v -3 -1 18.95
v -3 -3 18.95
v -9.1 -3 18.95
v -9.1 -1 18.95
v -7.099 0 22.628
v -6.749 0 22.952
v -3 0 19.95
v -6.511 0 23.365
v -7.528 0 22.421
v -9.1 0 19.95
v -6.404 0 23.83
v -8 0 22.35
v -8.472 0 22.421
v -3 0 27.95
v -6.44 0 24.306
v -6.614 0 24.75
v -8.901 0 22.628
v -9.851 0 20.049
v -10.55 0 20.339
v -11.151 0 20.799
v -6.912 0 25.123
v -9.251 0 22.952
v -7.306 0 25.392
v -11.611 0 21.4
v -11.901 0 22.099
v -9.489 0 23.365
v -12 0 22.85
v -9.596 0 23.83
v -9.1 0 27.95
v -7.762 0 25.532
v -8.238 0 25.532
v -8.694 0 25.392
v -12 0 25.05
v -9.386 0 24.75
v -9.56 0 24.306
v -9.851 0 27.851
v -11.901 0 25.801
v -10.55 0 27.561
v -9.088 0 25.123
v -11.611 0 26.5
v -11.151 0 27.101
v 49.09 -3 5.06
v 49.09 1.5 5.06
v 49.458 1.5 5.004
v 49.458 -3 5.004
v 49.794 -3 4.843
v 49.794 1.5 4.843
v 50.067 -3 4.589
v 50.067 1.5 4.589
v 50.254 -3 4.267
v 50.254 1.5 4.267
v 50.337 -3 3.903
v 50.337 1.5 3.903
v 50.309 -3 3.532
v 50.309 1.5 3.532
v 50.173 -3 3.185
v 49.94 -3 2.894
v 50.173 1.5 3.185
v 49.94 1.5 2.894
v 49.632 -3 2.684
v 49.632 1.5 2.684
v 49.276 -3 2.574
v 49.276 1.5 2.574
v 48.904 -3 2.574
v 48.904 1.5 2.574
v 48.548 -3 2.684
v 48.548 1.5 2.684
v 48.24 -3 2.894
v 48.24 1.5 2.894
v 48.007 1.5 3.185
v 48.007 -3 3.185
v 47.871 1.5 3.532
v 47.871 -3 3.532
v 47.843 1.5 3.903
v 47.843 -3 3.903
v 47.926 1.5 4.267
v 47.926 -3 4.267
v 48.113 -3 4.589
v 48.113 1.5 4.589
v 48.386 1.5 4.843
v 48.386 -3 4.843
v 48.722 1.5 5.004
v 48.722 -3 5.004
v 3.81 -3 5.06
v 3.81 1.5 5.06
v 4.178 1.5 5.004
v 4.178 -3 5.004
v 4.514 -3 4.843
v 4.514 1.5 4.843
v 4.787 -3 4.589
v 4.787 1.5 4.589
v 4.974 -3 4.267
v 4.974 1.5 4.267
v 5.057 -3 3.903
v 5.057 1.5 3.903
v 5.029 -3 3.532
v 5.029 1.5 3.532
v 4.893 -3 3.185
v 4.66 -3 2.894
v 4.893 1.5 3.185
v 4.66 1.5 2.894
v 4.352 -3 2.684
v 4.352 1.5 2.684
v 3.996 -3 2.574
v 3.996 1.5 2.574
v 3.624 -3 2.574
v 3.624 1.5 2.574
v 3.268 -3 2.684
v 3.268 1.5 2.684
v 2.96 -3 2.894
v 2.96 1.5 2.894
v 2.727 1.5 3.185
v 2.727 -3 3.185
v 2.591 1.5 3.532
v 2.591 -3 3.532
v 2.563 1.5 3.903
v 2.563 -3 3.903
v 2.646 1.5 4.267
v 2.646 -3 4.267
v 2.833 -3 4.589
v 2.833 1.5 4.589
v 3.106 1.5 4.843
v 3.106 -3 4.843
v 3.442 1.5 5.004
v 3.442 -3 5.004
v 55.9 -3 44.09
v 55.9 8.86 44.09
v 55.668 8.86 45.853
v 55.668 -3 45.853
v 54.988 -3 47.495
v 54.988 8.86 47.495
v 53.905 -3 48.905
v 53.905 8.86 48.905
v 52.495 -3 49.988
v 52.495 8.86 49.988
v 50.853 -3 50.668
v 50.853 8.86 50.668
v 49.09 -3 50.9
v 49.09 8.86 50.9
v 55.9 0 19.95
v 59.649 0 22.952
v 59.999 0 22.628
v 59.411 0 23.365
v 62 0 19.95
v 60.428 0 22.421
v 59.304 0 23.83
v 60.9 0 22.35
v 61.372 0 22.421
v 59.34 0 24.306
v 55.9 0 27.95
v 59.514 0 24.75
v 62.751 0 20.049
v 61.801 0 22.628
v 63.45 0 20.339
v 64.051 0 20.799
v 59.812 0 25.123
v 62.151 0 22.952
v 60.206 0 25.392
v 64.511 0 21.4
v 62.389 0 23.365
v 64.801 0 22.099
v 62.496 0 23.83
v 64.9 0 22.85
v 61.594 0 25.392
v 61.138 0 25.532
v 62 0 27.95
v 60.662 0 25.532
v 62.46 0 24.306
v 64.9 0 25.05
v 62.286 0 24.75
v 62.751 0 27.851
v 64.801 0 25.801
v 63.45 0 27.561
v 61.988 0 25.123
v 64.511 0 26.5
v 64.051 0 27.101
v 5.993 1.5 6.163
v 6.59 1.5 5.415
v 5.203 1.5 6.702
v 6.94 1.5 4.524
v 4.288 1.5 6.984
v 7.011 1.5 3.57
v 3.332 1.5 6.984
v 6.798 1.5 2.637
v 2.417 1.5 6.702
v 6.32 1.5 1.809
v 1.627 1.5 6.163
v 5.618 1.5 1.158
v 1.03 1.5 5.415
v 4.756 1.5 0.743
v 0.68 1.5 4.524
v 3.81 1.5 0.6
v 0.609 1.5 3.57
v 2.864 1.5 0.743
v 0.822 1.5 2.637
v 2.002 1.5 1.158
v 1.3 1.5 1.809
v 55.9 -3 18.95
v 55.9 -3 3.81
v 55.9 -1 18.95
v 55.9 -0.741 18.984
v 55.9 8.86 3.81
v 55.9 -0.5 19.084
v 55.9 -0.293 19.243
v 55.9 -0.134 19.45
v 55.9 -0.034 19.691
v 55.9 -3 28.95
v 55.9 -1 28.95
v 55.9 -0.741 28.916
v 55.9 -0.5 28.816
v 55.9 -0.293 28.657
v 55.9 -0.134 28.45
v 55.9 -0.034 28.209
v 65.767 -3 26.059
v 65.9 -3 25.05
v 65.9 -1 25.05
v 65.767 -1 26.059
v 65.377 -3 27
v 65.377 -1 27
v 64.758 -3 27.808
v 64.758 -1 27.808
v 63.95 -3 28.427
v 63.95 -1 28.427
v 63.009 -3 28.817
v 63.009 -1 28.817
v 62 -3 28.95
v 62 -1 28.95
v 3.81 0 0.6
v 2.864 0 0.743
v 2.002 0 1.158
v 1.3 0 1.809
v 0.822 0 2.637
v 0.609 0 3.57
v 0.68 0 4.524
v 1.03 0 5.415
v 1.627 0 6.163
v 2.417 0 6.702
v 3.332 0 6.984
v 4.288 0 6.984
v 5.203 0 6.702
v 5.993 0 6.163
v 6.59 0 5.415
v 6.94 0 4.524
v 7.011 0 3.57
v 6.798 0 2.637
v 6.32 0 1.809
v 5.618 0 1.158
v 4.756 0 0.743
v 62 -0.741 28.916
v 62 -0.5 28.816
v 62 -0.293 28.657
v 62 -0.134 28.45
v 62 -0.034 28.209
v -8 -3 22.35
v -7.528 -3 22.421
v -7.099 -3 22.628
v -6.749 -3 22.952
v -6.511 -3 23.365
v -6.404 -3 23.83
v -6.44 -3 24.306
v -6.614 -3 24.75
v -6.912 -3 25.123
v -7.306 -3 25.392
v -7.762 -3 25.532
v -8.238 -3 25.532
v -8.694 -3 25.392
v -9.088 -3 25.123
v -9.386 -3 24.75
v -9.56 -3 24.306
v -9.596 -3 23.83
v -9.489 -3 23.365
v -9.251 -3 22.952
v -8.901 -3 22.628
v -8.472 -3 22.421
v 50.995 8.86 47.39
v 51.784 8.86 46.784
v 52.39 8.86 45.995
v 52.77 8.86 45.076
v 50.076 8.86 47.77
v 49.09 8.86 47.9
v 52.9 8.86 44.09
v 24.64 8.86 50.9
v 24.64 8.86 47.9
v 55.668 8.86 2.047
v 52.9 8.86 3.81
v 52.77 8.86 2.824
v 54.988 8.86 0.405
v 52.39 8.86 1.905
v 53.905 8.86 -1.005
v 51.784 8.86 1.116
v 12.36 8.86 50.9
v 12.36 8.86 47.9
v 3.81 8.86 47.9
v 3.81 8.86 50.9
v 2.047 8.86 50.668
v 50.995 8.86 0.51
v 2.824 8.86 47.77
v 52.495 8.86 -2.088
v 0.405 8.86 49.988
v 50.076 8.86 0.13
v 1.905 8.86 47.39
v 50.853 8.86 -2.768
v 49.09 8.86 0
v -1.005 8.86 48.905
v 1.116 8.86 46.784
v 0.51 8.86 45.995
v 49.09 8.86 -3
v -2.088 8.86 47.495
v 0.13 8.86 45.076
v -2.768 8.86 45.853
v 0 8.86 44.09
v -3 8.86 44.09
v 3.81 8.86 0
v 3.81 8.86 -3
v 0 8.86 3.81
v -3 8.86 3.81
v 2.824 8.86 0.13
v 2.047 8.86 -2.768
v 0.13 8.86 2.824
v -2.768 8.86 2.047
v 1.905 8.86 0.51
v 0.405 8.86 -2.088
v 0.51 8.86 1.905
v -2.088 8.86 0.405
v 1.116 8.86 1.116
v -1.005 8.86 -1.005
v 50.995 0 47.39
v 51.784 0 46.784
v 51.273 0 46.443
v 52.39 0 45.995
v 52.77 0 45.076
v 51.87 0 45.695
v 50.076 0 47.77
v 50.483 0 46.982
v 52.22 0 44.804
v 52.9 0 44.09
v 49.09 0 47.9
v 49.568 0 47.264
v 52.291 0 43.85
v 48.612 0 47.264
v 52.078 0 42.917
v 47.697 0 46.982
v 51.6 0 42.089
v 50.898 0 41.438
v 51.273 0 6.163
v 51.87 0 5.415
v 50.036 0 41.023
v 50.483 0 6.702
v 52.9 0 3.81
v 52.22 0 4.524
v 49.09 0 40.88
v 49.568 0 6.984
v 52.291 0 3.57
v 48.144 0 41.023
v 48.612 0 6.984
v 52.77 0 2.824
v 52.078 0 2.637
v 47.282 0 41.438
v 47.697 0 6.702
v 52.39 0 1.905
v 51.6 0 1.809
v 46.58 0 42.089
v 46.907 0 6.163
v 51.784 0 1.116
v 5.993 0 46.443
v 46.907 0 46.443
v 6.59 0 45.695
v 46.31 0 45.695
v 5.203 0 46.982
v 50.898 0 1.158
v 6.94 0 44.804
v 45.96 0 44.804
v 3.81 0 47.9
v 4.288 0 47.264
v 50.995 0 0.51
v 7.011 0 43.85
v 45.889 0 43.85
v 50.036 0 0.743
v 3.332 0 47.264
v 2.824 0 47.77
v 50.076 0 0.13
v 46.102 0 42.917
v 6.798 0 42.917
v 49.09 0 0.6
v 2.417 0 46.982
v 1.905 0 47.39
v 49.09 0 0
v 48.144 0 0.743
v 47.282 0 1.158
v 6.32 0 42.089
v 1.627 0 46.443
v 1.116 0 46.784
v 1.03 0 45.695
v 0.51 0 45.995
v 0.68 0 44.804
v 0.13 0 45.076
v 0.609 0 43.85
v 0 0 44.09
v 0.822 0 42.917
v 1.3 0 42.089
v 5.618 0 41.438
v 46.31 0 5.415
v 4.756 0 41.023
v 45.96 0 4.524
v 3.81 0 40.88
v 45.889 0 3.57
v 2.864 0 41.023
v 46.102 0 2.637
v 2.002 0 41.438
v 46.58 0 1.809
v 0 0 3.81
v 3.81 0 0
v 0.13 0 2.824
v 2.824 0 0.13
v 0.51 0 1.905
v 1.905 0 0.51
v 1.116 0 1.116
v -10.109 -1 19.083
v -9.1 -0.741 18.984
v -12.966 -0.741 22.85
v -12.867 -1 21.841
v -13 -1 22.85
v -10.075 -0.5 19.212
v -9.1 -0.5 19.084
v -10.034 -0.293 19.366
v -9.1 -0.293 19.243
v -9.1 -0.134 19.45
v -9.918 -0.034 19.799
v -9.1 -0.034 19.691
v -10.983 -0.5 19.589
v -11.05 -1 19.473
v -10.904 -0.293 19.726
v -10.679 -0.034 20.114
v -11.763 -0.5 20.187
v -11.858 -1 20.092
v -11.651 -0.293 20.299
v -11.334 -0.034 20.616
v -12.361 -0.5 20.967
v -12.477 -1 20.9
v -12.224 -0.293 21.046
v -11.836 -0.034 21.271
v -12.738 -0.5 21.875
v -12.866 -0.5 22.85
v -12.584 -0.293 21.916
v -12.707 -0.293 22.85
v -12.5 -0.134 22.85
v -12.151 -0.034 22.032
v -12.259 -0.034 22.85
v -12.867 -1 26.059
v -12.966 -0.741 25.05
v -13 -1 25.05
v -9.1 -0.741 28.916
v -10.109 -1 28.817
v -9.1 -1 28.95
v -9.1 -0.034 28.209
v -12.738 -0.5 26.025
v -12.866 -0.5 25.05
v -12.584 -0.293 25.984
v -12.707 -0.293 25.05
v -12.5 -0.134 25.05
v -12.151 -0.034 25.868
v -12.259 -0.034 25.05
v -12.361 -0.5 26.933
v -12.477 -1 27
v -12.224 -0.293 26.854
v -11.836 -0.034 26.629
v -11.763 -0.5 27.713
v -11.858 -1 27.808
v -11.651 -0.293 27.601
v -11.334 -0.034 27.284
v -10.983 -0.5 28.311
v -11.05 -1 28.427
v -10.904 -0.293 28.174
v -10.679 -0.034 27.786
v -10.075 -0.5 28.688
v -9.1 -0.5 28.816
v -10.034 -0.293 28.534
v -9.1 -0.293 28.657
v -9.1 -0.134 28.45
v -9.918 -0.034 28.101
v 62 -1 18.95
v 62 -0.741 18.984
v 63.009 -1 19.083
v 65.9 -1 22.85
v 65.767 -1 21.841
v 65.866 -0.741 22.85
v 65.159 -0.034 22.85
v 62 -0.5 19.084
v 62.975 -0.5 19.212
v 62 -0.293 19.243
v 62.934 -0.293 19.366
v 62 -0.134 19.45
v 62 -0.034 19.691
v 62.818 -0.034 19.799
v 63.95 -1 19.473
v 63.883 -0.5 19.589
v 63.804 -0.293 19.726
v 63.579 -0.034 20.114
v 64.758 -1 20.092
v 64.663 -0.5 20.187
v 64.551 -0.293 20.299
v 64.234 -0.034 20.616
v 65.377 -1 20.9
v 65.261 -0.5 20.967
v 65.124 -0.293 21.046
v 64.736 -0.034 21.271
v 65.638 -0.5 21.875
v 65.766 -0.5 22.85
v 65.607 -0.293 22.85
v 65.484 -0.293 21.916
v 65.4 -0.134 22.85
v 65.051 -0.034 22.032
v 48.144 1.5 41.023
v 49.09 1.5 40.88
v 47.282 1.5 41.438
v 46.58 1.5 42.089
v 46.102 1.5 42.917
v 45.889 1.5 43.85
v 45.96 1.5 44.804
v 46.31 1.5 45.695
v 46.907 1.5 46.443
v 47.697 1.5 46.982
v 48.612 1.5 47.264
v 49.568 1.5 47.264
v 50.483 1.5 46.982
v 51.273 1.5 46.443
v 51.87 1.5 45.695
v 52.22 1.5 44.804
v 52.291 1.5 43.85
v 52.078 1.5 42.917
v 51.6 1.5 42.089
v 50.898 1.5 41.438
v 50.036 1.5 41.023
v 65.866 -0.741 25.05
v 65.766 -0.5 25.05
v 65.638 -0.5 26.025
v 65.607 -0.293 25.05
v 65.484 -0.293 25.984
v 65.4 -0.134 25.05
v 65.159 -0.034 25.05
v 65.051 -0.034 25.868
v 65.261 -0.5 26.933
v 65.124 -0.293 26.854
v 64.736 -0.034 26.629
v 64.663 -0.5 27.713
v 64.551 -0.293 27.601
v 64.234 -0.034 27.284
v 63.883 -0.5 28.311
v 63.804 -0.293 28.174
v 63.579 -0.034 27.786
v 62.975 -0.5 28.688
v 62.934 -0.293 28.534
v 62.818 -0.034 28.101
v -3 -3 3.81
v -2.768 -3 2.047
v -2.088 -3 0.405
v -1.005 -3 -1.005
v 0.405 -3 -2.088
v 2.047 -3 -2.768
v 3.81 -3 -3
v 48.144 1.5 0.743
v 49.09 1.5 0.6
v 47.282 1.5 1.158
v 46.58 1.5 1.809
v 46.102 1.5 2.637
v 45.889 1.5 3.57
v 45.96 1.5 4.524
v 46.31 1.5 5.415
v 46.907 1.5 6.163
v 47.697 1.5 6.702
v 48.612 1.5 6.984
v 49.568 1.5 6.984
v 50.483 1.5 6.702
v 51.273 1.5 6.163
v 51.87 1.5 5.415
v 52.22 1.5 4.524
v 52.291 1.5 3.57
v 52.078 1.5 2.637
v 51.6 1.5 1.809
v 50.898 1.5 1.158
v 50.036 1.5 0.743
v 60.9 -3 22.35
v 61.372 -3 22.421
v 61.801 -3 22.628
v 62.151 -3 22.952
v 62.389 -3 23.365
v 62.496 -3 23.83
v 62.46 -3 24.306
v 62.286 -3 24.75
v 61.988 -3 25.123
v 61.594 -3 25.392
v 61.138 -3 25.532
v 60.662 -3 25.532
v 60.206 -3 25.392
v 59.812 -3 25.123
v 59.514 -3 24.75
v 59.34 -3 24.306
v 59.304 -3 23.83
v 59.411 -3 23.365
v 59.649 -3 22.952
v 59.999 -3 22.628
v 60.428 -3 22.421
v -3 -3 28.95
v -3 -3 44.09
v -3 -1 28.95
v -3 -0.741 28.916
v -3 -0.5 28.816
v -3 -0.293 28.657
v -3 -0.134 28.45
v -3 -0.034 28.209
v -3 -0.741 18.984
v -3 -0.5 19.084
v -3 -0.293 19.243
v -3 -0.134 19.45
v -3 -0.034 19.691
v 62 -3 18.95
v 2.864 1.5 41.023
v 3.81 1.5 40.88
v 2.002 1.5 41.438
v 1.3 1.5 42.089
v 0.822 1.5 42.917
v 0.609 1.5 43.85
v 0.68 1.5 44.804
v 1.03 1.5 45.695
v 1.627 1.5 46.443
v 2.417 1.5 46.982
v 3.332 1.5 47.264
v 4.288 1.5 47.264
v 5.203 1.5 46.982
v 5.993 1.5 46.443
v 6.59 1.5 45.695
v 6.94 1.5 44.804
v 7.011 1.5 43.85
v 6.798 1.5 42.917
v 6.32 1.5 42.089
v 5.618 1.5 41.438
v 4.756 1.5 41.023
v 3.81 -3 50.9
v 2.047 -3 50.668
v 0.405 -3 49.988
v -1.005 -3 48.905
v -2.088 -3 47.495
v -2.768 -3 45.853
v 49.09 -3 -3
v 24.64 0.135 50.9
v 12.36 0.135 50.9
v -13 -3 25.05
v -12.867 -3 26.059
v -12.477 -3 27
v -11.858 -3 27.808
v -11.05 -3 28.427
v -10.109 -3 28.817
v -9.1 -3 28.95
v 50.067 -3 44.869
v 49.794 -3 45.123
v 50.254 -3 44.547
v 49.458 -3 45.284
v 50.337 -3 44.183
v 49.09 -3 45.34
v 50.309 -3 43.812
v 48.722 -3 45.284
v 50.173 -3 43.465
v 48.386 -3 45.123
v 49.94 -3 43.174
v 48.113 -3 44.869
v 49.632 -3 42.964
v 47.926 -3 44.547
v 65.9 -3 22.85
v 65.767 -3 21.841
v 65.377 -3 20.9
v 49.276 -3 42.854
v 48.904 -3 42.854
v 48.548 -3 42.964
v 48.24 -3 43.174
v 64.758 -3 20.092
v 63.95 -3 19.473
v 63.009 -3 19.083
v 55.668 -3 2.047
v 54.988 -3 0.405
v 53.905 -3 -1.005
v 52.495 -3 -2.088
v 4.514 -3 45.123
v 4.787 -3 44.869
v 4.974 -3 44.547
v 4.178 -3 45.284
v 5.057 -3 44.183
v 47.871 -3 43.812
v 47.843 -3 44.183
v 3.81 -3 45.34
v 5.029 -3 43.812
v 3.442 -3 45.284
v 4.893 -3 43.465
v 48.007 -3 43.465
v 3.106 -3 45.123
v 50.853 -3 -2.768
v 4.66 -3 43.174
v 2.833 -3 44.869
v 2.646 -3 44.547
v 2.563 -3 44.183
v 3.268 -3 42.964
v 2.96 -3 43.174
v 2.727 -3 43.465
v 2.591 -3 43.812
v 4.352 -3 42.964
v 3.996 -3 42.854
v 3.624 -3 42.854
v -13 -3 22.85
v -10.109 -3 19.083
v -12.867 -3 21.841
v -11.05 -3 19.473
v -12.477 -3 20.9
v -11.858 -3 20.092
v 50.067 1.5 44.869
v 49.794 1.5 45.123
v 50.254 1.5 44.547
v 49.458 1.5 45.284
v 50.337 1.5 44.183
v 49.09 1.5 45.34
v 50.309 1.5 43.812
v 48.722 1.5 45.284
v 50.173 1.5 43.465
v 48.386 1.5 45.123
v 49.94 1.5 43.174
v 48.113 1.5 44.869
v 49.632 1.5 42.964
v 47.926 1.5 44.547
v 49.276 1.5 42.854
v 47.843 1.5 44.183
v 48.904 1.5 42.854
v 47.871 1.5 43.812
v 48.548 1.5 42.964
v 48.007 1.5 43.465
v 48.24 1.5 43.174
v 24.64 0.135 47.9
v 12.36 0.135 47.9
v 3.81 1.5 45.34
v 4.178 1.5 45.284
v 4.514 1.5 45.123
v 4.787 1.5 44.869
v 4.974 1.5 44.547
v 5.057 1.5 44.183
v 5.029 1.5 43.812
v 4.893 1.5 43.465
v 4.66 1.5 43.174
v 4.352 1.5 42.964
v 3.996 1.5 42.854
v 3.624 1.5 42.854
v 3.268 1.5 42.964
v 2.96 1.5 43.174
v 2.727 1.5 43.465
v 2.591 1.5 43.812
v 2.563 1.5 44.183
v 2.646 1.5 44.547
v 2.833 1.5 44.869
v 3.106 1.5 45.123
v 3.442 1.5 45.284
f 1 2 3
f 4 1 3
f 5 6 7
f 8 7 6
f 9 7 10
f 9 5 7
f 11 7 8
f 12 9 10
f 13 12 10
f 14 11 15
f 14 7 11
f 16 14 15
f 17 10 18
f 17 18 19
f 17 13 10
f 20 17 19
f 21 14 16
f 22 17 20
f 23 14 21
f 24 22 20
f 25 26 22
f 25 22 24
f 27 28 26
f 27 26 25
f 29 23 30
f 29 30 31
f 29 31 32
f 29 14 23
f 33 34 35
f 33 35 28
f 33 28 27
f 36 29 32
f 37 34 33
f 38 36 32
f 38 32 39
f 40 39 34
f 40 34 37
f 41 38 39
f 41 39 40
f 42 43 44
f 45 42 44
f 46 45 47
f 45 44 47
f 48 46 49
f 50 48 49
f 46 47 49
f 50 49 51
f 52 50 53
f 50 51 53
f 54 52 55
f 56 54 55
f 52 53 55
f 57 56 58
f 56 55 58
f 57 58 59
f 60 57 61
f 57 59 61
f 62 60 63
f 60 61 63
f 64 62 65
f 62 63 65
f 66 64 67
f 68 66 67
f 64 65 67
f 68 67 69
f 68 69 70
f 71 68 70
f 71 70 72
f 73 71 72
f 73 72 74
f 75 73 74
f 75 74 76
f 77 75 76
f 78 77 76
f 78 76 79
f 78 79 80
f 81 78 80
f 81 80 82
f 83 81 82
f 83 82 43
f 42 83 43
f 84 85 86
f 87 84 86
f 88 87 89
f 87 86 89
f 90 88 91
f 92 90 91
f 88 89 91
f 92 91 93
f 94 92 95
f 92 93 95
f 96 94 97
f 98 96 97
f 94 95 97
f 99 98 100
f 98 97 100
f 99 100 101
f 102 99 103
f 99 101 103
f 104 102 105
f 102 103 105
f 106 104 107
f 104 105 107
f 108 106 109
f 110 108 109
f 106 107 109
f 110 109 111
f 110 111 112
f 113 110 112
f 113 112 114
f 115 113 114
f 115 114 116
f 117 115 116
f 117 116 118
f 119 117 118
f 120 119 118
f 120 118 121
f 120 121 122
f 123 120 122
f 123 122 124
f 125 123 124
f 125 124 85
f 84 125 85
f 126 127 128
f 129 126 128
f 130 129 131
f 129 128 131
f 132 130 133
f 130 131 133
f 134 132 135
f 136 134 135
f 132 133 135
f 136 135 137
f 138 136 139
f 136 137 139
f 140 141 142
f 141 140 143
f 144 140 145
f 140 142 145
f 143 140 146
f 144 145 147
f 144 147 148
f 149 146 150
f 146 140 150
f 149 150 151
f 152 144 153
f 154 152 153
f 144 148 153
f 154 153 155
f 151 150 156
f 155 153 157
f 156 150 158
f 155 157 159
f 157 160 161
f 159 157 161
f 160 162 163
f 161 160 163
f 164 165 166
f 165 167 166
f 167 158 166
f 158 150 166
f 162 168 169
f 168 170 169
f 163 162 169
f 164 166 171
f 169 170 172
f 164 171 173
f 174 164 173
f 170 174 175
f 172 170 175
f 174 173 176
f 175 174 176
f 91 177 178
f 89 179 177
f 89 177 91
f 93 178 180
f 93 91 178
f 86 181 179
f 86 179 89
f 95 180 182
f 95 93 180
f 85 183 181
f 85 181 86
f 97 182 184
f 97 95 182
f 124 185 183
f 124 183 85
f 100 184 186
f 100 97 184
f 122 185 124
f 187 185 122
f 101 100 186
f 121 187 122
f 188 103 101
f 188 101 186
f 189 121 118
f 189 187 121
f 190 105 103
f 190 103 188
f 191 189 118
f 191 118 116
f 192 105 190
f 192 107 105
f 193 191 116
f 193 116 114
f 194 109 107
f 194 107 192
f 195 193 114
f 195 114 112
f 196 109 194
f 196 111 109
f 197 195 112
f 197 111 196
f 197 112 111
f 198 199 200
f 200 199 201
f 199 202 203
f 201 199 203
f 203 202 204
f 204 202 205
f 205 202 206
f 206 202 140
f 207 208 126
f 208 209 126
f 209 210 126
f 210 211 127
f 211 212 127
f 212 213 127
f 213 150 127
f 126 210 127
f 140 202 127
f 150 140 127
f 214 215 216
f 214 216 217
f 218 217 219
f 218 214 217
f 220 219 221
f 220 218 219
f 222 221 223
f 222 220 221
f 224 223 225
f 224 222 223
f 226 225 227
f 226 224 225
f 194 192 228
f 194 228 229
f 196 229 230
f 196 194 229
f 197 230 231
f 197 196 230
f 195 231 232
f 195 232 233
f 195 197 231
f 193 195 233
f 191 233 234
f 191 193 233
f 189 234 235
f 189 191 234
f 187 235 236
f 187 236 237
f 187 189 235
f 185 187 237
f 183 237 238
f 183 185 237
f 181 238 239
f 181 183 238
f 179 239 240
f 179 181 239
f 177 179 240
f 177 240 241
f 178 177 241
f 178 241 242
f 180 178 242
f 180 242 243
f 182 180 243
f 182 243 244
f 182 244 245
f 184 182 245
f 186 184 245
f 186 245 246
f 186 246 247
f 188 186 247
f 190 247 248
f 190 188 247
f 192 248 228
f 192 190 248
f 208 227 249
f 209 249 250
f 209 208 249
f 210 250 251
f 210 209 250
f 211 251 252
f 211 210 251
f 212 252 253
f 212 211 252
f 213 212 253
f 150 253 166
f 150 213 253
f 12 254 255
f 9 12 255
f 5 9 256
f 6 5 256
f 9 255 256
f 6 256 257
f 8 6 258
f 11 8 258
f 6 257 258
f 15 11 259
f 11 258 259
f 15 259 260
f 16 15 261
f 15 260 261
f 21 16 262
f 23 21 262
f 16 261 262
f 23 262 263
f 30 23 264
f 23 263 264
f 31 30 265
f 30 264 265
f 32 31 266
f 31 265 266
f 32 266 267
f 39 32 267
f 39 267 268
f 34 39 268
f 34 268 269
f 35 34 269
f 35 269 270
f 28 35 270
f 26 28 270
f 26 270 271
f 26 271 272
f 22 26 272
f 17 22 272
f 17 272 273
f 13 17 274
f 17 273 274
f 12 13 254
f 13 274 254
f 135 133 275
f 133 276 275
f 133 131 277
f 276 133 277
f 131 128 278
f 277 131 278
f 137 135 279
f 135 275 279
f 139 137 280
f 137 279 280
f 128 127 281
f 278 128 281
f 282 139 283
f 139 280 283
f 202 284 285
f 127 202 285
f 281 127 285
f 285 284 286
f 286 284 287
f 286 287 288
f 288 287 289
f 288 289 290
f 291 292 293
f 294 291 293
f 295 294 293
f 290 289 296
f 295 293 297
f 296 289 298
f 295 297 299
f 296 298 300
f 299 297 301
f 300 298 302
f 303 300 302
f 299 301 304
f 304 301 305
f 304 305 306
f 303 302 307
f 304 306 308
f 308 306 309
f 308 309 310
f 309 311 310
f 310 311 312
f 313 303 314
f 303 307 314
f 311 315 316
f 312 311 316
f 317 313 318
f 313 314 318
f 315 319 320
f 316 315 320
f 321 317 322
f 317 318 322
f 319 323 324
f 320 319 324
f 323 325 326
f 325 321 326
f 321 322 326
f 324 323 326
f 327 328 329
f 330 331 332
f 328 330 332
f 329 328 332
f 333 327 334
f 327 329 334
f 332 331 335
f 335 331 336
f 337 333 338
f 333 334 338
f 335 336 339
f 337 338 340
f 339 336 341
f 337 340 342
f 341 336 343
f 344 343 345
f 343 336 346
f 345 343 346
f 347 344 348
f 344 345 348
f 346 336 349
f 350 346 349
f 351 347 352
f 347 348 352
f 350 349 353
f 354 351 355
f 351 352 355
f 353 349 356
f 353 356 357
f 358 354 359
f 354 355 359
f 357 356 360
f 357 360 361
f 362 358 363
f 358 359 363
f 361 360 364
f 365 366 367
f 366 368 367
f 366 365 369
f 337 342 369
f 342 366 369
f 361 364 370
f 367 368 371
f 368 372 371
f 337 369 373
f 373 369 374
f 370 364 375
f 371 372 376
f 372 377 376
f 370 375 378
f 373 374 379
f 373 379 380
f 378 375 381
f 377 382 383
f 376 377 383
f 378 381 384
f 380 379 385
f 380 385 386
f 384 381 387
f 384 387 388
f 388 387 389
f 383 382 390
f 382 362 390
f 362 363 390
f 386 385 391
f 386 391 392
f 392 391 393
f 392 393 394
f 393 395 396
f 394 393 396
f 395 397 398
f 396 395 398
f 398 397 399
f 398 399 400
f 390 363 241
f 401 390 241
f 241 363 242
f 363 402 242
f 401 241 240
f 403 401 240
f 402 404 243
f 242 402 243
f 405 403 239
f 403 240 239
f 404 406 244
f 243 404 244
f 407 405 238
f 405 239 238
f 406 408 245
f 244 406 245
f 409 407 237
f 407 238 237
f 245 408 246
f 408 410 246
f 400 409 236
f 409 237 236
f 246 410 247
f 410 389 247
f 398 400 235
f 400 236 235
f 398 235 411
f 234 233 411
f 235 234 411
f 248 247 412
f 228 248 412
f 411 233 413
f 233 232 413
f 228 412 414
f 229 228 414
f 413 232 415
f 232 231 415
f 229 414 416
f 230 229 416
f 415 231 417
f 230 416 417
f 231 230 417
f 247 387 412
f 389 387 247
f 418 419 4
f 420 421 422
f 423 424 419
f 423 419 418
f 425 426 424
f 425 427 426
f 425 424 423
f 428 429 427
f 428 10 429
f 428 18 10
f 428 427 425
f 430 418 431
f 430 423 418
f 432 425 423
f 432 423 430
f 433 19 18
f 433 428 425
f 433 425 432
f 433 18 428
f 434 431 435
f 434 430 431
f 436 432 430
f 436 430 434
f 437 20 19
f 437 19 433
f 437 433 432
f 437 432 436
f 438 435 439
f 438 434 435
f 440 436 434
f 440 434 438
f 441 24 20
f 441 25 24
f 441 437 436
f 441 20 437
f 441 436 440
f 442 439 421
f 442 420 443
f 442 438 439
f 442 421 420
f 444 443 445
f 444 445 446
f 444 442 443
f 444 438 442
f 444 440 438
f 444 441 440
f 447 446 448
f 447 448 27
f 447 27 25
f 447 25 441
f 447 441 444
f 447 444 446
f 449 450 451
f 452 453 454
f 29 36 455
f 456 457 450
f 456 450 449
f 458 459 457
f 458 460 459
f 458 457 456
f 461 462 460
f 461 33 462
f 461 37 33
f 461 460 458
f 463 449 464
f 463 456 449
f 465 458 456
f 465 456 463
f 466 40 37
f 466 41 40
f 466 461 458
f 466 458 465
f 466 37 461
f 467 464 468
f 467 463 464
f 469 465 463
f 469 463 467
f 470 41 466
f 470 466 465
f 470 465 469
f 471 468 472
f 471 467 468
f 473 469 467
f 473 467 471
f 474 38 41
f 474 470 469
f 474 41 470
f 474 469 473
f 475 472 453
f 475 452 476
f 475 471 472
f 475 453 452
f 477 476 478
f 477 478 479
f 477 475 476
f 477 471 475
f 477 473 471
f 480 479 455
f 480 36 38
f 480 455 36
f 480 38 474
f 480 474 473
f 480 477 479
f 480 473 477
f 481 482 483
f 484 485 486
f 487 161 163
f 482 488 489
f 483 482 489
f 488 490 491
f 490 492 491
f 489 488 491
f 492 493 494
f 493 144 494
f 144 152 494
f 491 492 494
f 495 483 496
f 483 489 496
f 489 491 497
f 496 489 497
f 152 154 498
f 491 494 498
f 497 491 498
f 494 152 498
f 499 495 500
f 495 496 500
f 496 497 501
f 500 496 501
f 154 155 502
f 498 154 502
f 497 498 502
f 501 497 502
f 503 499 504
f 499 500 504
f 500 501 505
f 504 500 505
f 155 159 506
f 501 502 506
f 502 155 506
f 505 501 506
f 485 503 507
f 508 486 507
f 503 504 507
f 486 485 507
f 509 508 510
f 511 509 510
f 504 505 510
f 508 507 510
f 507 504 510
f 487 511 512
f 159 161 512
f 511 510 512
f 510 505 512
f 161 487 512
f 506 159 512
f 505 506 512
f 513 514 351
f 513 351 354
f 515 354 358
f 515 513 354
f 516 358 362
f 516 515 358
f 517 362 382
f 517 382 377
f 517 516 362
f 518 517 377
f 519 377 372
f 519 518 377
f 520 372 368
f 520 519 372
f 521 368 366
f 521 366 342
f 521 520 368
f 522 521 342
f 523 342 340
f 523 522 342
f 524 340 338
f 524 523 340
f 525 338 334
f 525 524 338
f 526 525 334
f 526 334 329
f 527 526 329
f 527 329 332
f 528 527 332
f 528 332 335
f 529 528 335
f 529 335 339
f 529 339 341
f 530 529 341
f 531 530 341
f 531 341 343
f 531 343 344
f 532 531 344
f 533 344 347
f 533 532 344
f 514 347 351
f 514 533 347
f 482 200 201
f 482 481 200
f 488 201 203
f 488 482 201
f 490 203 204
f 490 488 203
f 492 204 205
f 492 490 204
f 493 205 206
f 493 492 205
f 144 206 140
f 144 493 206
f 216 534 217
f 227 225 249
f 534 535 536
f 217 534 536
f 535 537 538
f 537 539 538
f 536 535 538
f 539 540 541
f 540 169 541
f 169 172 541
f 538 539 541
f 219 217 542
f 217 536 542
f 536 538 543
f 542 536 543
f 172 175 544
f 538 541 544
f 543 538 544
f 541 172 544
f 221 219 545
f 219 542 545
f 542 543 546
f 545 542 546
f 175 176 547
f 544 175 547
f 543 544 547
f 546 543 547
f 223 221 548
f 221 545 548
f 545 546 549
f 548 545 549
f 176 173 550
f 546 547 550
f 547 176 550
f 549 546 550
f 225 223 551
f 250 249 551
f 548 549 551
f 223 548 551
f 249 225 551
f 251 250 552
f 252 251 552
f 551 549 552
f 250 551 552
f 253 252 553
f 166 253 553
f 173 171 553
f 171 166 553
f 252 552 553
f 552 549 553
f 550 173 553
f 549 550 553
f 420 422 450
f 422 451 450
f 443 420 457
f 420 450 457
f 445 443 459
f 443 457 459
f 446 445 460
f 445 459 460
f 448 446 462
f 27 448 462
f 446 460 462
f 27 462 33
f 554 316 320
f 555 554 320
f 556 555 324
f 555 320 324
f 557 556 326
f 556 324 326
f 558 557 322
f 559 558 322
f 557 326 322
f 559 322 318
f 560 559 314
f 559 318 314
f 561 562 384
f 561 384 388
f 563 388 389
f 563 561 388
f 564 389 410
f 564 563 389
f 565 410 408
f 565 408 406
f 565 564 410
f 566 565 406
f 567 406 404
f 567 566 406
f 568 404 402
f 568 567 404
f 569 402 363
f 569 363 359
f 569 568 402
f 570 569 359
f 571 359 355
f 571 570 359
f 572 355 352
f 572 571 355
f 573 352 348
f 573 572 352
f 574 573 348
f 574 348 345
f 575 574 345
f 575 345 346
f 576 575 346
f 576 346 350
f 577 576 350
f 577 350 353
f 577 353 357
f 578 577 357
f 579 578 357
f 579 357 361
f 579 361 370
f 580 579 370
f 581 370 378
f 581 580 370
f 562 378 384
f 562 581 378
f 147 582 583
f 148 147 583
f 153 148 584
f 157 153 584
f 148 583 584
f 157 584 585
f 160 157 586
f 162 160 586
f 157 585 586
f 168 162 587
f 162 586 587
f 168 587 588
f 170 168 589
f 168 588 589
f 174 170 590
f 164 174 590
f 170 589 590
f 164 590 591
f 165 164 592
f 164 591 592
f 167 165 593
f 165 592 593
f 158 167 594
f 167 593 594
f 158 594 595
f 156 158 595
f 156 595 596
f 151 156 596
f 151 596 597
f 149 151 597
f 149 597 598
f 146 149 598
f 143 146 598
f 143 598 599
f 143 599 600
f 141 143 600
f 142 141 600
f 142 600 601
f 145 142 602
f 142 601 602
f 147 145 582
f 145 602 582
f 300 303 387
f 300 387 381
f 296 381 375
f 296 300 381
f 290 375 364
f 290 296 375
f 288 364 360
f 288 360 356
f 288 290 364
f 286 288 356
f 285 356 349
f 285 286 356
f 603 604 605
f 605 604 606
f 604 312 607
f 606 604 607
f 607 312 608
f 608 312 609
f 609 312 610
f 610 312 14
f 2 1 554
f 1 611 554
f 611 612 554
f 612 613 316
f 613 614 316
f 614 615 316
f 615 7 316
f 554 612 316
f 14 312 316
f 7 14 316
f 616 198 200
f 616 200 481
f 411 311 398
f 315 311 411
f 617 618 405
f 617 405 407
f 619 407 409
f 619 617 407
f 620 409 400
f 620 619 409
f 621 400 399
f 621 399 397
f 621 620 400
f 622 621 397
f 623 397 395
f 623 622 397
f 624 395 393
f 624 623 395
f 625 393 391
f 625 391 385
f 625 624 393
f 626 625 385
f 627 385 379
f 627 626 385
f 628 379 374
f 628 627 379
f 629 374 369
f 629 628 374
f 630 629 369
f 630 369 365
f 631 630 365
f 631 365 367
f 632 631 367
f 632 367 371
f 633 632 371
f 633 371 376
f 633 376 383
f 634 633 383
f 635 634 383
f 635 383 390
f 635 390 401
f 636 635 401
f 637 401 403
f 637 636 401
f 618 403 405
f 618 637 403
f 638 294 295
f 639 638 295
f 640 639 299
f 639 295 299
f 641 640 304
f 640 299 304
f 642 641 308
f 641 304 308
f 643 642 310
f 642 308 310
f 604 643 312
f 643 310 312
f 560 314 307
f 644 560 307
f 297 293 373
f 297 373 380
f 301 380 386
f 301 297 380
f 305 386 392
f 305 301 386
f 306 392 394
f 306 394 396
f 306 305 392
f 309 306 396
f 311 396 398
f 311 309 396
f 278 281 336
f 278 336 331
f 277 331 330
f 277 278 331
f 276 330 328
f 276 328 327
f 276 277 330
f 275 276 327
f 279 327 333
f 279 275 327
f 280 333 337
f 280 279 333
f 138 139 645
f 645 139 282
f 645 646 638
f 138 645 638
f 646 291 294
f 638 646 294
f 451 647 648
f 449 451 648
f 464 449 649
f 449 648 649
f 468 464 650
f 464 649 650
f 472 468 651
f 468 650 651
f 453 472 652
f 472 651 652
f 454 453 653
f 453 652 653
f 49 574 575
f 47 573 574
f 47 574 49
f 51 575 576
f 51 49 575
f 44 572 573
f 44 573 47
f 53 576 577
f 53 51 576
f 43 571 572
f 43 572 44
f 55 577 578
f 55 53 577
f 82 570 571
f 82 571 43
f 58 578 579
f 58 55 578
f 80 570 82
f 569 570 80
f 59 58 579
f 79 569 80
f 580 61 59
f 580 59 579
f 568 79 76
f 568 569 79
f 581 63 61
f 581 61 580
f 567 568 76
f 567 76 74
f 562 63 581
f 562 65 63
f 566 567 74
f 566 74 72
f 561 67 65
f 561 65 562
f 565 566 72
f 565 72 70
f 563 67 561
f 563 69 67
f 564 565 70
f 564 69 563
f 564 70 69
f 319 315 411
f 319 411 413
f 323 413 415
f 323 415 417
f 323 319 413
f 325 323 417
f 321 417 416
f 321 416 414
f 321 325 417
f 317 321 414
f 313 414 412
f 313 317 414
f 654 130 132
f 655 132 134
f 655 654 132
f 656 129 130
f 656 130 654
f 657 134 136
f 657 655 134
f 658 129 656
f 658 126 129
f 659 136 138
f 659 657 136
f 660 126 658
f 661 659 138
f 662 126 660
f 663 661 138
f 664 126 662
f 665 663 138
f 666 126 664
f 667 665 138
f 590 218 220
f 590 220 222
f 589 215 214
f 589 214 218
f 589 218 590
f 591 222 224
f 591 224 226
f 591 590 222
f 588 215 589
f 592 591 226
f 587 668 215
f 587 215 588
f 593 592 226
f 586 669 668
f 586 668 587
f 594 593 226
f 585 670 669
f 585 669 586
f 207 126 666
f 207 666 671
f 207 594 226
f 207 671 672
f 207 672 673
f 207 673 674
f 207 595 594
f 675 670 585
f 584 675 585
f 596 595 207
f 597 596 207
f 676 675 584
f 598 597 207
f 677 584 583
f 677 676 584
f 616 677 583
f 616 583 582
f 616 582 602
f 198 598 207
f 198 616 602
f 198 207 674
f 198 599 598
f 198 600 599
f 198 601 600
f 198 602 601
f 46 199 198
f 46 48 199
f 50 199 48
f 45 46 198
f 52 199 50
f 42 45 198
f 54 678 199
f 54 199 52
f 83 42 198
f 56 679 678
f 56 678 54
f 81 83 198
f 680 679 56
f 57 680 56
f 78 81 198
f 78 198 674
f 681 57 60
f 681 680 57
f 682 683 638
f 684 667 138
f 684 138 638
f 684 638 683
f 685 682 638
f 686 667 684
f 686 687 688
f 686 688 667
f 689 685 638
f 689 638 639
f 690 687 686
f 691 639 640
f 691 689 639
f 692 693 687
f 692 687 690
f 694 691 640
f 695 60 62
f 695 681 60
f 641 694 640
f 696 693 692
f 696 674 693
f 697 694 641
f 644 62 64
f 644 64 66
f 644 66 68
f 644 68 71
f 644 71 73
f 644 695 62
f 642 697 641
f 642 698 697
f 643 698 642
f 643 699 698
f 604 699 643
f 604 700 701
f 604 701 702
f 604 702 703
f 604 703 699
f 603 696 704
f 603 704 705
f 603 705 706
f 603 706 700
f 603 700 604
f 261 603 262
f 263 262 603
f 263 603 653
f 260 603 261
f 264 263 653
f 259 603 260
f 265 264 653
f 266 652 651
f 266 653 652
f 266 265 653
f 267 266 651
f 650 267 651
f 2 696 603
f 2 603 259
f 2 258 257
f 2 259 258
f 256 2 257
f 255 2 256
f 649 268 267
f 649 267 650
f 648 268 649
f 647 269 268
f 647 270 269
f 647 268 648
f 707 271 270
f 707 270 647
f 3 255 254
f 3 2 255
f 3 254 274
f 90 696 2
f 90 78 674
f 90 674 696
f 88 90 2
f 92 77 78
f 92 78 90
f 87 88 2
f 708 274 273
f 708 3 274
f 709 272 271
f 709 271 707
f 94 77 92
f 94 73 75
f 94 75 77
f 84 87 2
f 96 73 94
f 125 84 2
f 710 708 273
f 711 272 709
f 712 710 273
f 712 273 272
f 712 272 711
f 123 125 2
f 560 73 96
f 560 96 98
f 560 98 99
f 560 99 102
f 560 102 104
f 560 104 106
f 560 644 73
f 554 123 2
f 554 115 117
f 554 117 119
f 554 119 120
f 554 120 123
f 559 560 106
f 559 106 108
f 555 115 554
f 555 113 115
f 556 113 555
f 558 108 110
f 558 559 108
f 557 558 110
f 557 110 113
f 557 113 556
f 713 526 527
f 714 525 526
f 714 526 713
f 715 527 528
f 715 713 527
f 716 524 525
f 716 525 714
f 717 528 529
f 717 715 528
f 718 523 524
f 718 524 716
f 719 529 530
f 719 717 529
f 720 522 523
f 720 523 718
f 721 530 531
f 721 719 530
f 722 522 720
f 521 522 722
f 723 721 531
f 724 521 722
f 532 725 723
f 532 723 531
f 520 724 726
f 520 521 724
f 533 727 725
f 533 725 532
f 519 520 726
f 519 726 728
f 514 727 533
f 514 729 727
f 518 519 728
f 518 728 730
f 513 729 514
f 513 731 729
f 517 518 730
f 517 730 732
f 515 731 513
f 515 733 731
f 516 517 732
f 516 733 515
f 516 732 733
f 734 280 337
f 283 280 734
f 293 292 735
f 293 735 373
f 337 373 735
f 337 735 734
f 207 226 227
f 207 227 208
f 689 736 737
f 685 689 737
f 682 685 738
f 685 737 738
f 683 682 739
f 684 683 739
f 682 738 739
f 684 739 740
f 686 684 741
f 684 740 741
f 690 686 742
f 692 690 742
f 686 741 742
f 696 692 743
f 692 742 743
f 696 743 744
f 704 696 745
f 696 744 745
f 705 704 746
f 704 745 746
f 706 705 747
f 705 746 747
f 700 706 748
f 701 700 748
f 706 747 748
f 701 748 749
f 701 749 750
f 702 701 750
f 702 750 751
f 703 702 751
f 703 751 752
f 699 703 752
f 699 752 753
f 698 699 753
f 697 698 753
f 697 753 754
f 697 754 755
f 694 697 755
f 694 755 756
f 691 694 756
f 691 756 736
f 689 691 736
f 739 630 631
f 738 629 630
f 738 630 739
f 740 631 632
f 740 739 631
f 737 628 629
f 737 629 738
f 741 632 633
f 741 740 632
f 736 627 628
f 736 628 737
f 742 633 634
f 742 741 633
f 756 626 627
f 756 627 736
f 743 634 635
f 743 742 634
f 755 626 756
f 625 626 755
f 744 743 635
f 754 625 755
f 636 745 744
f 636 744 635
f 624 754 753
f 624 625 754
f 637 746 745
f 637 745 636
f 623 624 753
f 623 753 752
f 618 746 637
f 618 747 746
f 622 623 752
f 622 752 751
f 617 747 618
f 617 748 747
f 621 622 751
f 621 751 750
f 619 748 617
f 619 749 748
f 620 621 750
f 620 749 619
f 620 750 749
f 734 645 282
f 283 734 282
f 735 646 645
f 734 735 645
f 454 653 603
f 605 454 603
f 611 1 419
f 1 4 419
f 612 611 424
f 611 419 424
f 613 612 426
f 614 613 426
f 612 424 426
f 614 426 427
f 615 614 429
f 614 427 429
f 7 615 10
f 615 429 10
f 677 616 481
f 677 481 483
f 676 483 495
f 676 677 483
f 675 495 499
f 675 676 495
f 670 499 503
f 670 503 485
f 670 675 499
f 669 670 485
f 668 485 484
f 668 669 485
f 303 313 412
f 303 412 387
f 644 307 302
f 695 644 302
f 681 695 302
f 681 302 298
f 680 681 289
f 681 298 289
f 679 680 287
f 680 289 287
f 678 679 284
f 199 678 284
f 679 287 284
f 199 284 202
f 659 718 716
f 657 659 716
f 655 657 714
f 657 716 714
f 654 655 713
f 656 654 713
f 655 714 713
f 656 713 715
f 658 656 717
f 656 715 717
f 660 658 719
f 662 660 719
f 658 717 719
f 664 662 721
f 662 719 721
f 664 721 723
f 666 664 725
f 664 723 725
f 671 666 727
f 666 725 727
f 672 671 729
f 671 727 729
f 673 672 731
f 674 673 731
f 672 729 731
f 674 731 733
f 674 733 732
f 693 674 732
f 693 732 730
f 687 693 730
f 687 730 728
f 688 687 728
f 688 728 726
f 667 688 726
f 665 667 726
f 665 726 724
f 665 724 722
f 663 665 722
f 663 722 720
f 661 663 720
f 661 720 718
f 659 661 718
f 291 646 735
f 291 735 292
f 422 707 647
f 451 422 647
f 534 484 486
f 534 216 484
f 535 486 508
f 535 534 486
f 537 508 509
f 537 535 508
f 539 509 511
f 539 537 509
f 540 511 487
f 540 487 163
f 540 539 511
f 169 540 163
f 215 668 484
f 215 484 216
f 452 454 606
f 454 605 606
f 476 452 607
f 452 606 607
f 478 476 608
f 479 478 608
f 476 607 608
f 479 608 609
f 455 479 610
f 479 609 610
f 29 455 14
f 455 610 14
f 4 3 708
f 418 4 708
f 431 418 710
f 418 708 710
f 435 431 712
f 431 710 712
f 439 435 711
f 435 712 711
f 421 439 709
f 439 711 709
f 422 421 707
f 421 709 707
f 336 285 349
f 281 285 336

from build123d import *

# Parameters (mm, degrees)
BOSS_EXTRUDE1_DEPTH = 3
CUT_EXTRUDE1_REACH  = 77.661
SKETCH1_3_R         = 1.25
BOSS_EXTRUDE2_START = 8.86
BOSS_EXTRUDE2_DEPTH = 8.86
BOSS_EXTRUDE3_START = 1.5
SKETCH1_5_R         = 3.21
SKETCH1_5_R_2       = 1.25
BOSS_EXTRUDE3_DEPTH = 1.5
SKETCH2_W           = 12.28
SKETCH2_H           = 8.73
CUT_EXTRUDE2_DEPTH  = 3
SKETCH3_R           = 1.6
BOSS_EXTRUDE4_DEPTH = 3
FILLET1_R           = 1
FILLET2_R           = 1


with BuildPart() as part:
    # Sketch1 → Boss-Extrude1 (new body)
    with BuildSketch(Plane(origin=(0, 0, 0), x_dir=(1, 0, 0), z_dir=(0, 1, 0))):
        with BuildLine():
            Line((3.81, 3), (49.09, 3))
            ThreePointArc((49.09, 3), (53.90539718, 1.00539718), (55.9, -3.81))
            Line((55.9, -3.81), (55.9, -44.09))
            ThreePointArc((55.9, -44.09), (53.90539718, -48.90539718), (49.09, -50.9))
            Line((49.09, -50.9), (3.81, -50.9))
            ThreePointArc((3.81, -50.9), (-1.00539718, -48.90539718), (-3, -44.09))
            Line((-3, -44.09), (-3, -3.81))
            ThreePointArc((-3, -3.81), (-1.00539718, 1.00539718), (3.81, 3))
        make_face()
    extrude(amount=-BOSS_EXTRUDE1_DEPTH)

    # Sketch1<3> → Cut-Extrude1 (cut, up to next)
    with BuildSketch(Plane(origin=(0, 0, 0), x_dir=(1, 0, 0), z_dir=(0, 1, 0)), mode=Mode.PRIVATE) as cut_extrude1_sk1:
        with Locations((49.09, -44.09)):
            Circle(SKETCH1_3_R)
    cut_extrude1_tool1 = extrude(cut_extrude1_sk1.sketch, amount=-CUT_EXTRUDE1_REACH, mode=Mode.PRIVATE) & part.part
    # Sketch1<3> → Cut-Extrude1 (cut, up to next)
    with BuildSketch(Plane(origin=(0, 0, 0), x_dir=(1, 0, 0), z_dir=(0, 1, 0)), mode=Mode.PRIVATE) as cut_extrude1_sk2:
        with Locations((3.81, -44.09)):
            Circle(SKETCH1_3_R)
    cut_extrude1_tool2 = extrude(cut_extrude1_sk2.sketch, amount=-CUT_EXTRUDE1_REACH, mode=Mode.PRIVATE) & part.part
    # Sketch1<3> → Cut-Extrude1 (cut, up to next)
    with BuildSketch(Plane(origin=(0, 0, 0), x_dir=(1, 0, 0), z_dir=(0, 1, 0)), mode=Mode.PRIVATE) as cut_extrude1_sk3:
        with Locations((3.81, -3.81)):
            Circle(SKETCH1_3_R)
    cut_extrude1_tool3 = extrude(cut_extrude1_sk3.sketch, amount=-CUT_EXTRUDE1_REACH, mode=Mode.PRIVATE) & part.part
    # Sketch1<3> → Cut-Extrude1 (cut, up to next)
    with BuildSketch(Plane(origin=(0, 0, 0), x_dir=(1, 0, 0), z_dir=(0, 1, 0)), mode=Mode.PRIVATE) as cut_extrude1_sk4:
        with Locations((49.09, -3.81)):
            Circle(SKETCH1_3_R)
    cut_extrude1_tool4 = extrude(cut_extrude1_sk4.sketch, amount=-CUT_EXTRUDE1_REACH, mode=Mode.PRIVATE) & part.part
    add(cut_extrude1_tool1.solids().sort_by_distance((49.09, 0, 44.09))[0], mode=Mode.SUBTRACT)
    add(cut_extrude1_tool2.solids().sort_by_distance((3.81, 0, 44.09))[0], mode=Mode.SUBTRACT)
    add(cut_extrude1_tool3.solids().sort_by_distance((3.81, 0, 3.81))[0], mode=Mode.SUBTRACT)
    add(cut_extrude1_tool4.solids().sort_by_distance((49.09, 0, 3.81))[0], mode=Mode.SUBTRACT)

    # Sketch1<4> → Boss-Extrude2 (add)
    with BuildSketch(Plane(origin=(0, 0, 0), x_dir=(1, 0, 0), z_dir=(0, 1, 0)).offset(BOSS_EXTRUDE2_START)):
        with BuildLine():
            Line((49.09, 3), (3.81, 3))
            ThreePointArc((3.81, 3), (-1.00539718, 1.00539718), (-3, -3.81))
            Line((-3, -3.81), (-3, -44.09))
            ThreePointArc((-3, -44.09), (-1.00539718, -48.90539718), (3.81, -50.9))
            Line((3.81, -50.9), (49.09, -50.9))
            ThreePointArc((49.09, -50.9), (53.90539718, -48.90539718), (55.9, -44.09))
            Line((55.9, -44.09), (55.9, -3.81))
            ThreePointArc((55.9, -3.81), (53.90539718, 1.00539718), (49.09, 3))
        make_face()
        with BuildLine():
            ThreePointArc((0, -3.81), (1.115923164, -1.115923164), (3.81, 0))
            Line((3.81, 0), (49.09, 0))
            ThreePointArc((49.09, 0), (51.784076836, -1.115923164), (52.9, -3.81))
            Line((52.9, -3.81), (52.9, -44.09))
            ThreePointArc((52.9, -44.09), (51.784076836, -46.784076836), (49.09, -47.9))
            Line((49.09, -47.9), (3.81, -47.9))
            ThreePointArc((3.81, -47.9), (1.115923164, -46.784076836), (0, -44.09))
            Line((0, -44.09), (0, -3.81))
        make_face(mode=Mode.SUBTRACT)
    extrude(amount=-BOSS_EXTRUDE2_DEPTH)

    # Sketch1<5> → Boss-Extrude3 (add)
    # profile 1 of 4: a face of its own
    with BuildSketch(Plane(origin=(0, 0, 0), x_dir=(1, 0, 0), z_dir=(0, 1, 0)).offset(BOSS_EXTRUDE3_START)):
        with Locations((3.81, -3.81)):
            Circle(SKETCH1_5_R)
        with Locations((3.81, -3.81)):
            Circle(SKETCH1_5_R_2, mode=Mode.SUBTRACT)
    # profile 2 of 4: a face of its own
    with BuildSketch(Plane(origin=(0, 0, 0), x_dir=(1, 0, 0), z_dir=(0, 1, 0)).offset(BOSS_EXTRUDE3_START)):
        with Locations((49.09, -3.81)):
            Circle(SKETCH1_5_R)
        with Locations((49.09, -3.81)):
            Circle(SKETCH1_5_R_2, mode=Mode.SUBTRACT)
    # profile 3 of 4: a face of its own
    with BuildSketch(Plane(origin=(0, 0, 0), x_dir=(1, 0, 0), z_dir=(0, 1, 0)).offset(BOSS_EXTRUDE3_START)):
        with Locations((49.09, -44.09)):
            Circle(SKETCH1_5_R)
        with Locations((49.09, -44.09)):
            Circle(SKETCH1_5_R_2, mode=Mode.SUBTRACT)
    # profile 4 of 4: a face of its own
    with BuildSketch(Plane(origin=(0, 0, 0), x_dir=(1, 0, 0), z_dir=(0, 1, 0)).offset(BOSS_EXTRUDE3_START)):
        with Locations((3.81, -44.09)):
            Circle(SKETCH1_5_R)
        with Locations((3.81, -44.09)):
            Circle(SKETCH1_5_R_2, mode=Mode.SUBTRACT)
    extrude(amount=-BOSS_EXTRUDE3_DEPTH)

    # Sketch2 → Cut-Extrude2 (cut)
    with BuildSketch(Plane.XY.offset(50.9)):
        with Locations((18.5, 4.5)):
            Rectangle(SKETCH2_W, SKETCH2_H)
    extrude(amount=-CUT_EXTRUDE2_DEPTH, mode=Mode.SUBTRACT)

    # Sketch3 → Boss-Extrude4 (add)
    # profile 1 of 2: a face of its own
    with BuildSketch(Plane.XZ.offset(3)):
        with BuildLine():
            Line((55.9, 18.95), (62, 18.95))
            ThreePointArc((62, 18.95), (64.757716447, 20.092283553), (65.9, 22.85))
            Line((65.9, 22.85), (65.9, 25.05))
            ThreePointArc((65.9, 25.05), (64.757716447, 27.807716447), (62, 28.95))
            Line((62, 28.95), (55.9, 28.95))
            Line((55.9, 28.95), (55.9, 18.95))
        make_face()
        with Locations((60.9, 23.95)):
            Circle(SKETCH3_R, mode=Mode.SUBTRACT)
    # profile 2 of 2: a face of its own
    with BuildSketch(Plane.XZ.offset(3)):
        with BuildLine():
            Line((-3, 18.95), (-9.1, 18.95))
            ThreePointArc((-9.1, 18.95), (-11.857716447, 20.092283553), (-13, 22.85))
            Line((-13, 22.85), (-13, 25.05))
            ThreePointArc((-13, 25.05), (-11.857716447, 27.807716447), (-9.1, 28.95))
            Line((-9.1, 28.95), (-3, 28.95))
            Line((-3, 28.95), (-3, 18.95))
        make_face()
        with Locations((-8, 23.95)):
            Circle(SKETCH3_R, mode=Mode.SUBTRACT)
    extrude(amount=-BOSS_EXTRUDE4_DEPTH)

    # Fillet1
    fillet1_edges = [part.edges().sort_by_distance(p)[0] for p in [
        (58.95, 0, 18.95),
        (64.757716447, 0, 20.092283553),
        (65.9, 0, 23.95),
        (64.757716447, 0, 27.807716447),
        (58.95, 0, 28.95),
    ]]
    fillet(fillet1_edges, radius=FILLET1_R)

    # Fillet2
    fillet2_edges = [part.edges().sort_by_distance(p)[0] for p in [
        (-6.05, 0, 18.95),
        (-11.857716447, 0, 20.092283553),
        (-13, 0, 23.95),
        (-11.857716447, 0, 27.807716447),
        (-6.05, 0, 28.95),
    ]]
    fillet(fillet2_edges, radius=FILLET2_R)


solid = part.part
